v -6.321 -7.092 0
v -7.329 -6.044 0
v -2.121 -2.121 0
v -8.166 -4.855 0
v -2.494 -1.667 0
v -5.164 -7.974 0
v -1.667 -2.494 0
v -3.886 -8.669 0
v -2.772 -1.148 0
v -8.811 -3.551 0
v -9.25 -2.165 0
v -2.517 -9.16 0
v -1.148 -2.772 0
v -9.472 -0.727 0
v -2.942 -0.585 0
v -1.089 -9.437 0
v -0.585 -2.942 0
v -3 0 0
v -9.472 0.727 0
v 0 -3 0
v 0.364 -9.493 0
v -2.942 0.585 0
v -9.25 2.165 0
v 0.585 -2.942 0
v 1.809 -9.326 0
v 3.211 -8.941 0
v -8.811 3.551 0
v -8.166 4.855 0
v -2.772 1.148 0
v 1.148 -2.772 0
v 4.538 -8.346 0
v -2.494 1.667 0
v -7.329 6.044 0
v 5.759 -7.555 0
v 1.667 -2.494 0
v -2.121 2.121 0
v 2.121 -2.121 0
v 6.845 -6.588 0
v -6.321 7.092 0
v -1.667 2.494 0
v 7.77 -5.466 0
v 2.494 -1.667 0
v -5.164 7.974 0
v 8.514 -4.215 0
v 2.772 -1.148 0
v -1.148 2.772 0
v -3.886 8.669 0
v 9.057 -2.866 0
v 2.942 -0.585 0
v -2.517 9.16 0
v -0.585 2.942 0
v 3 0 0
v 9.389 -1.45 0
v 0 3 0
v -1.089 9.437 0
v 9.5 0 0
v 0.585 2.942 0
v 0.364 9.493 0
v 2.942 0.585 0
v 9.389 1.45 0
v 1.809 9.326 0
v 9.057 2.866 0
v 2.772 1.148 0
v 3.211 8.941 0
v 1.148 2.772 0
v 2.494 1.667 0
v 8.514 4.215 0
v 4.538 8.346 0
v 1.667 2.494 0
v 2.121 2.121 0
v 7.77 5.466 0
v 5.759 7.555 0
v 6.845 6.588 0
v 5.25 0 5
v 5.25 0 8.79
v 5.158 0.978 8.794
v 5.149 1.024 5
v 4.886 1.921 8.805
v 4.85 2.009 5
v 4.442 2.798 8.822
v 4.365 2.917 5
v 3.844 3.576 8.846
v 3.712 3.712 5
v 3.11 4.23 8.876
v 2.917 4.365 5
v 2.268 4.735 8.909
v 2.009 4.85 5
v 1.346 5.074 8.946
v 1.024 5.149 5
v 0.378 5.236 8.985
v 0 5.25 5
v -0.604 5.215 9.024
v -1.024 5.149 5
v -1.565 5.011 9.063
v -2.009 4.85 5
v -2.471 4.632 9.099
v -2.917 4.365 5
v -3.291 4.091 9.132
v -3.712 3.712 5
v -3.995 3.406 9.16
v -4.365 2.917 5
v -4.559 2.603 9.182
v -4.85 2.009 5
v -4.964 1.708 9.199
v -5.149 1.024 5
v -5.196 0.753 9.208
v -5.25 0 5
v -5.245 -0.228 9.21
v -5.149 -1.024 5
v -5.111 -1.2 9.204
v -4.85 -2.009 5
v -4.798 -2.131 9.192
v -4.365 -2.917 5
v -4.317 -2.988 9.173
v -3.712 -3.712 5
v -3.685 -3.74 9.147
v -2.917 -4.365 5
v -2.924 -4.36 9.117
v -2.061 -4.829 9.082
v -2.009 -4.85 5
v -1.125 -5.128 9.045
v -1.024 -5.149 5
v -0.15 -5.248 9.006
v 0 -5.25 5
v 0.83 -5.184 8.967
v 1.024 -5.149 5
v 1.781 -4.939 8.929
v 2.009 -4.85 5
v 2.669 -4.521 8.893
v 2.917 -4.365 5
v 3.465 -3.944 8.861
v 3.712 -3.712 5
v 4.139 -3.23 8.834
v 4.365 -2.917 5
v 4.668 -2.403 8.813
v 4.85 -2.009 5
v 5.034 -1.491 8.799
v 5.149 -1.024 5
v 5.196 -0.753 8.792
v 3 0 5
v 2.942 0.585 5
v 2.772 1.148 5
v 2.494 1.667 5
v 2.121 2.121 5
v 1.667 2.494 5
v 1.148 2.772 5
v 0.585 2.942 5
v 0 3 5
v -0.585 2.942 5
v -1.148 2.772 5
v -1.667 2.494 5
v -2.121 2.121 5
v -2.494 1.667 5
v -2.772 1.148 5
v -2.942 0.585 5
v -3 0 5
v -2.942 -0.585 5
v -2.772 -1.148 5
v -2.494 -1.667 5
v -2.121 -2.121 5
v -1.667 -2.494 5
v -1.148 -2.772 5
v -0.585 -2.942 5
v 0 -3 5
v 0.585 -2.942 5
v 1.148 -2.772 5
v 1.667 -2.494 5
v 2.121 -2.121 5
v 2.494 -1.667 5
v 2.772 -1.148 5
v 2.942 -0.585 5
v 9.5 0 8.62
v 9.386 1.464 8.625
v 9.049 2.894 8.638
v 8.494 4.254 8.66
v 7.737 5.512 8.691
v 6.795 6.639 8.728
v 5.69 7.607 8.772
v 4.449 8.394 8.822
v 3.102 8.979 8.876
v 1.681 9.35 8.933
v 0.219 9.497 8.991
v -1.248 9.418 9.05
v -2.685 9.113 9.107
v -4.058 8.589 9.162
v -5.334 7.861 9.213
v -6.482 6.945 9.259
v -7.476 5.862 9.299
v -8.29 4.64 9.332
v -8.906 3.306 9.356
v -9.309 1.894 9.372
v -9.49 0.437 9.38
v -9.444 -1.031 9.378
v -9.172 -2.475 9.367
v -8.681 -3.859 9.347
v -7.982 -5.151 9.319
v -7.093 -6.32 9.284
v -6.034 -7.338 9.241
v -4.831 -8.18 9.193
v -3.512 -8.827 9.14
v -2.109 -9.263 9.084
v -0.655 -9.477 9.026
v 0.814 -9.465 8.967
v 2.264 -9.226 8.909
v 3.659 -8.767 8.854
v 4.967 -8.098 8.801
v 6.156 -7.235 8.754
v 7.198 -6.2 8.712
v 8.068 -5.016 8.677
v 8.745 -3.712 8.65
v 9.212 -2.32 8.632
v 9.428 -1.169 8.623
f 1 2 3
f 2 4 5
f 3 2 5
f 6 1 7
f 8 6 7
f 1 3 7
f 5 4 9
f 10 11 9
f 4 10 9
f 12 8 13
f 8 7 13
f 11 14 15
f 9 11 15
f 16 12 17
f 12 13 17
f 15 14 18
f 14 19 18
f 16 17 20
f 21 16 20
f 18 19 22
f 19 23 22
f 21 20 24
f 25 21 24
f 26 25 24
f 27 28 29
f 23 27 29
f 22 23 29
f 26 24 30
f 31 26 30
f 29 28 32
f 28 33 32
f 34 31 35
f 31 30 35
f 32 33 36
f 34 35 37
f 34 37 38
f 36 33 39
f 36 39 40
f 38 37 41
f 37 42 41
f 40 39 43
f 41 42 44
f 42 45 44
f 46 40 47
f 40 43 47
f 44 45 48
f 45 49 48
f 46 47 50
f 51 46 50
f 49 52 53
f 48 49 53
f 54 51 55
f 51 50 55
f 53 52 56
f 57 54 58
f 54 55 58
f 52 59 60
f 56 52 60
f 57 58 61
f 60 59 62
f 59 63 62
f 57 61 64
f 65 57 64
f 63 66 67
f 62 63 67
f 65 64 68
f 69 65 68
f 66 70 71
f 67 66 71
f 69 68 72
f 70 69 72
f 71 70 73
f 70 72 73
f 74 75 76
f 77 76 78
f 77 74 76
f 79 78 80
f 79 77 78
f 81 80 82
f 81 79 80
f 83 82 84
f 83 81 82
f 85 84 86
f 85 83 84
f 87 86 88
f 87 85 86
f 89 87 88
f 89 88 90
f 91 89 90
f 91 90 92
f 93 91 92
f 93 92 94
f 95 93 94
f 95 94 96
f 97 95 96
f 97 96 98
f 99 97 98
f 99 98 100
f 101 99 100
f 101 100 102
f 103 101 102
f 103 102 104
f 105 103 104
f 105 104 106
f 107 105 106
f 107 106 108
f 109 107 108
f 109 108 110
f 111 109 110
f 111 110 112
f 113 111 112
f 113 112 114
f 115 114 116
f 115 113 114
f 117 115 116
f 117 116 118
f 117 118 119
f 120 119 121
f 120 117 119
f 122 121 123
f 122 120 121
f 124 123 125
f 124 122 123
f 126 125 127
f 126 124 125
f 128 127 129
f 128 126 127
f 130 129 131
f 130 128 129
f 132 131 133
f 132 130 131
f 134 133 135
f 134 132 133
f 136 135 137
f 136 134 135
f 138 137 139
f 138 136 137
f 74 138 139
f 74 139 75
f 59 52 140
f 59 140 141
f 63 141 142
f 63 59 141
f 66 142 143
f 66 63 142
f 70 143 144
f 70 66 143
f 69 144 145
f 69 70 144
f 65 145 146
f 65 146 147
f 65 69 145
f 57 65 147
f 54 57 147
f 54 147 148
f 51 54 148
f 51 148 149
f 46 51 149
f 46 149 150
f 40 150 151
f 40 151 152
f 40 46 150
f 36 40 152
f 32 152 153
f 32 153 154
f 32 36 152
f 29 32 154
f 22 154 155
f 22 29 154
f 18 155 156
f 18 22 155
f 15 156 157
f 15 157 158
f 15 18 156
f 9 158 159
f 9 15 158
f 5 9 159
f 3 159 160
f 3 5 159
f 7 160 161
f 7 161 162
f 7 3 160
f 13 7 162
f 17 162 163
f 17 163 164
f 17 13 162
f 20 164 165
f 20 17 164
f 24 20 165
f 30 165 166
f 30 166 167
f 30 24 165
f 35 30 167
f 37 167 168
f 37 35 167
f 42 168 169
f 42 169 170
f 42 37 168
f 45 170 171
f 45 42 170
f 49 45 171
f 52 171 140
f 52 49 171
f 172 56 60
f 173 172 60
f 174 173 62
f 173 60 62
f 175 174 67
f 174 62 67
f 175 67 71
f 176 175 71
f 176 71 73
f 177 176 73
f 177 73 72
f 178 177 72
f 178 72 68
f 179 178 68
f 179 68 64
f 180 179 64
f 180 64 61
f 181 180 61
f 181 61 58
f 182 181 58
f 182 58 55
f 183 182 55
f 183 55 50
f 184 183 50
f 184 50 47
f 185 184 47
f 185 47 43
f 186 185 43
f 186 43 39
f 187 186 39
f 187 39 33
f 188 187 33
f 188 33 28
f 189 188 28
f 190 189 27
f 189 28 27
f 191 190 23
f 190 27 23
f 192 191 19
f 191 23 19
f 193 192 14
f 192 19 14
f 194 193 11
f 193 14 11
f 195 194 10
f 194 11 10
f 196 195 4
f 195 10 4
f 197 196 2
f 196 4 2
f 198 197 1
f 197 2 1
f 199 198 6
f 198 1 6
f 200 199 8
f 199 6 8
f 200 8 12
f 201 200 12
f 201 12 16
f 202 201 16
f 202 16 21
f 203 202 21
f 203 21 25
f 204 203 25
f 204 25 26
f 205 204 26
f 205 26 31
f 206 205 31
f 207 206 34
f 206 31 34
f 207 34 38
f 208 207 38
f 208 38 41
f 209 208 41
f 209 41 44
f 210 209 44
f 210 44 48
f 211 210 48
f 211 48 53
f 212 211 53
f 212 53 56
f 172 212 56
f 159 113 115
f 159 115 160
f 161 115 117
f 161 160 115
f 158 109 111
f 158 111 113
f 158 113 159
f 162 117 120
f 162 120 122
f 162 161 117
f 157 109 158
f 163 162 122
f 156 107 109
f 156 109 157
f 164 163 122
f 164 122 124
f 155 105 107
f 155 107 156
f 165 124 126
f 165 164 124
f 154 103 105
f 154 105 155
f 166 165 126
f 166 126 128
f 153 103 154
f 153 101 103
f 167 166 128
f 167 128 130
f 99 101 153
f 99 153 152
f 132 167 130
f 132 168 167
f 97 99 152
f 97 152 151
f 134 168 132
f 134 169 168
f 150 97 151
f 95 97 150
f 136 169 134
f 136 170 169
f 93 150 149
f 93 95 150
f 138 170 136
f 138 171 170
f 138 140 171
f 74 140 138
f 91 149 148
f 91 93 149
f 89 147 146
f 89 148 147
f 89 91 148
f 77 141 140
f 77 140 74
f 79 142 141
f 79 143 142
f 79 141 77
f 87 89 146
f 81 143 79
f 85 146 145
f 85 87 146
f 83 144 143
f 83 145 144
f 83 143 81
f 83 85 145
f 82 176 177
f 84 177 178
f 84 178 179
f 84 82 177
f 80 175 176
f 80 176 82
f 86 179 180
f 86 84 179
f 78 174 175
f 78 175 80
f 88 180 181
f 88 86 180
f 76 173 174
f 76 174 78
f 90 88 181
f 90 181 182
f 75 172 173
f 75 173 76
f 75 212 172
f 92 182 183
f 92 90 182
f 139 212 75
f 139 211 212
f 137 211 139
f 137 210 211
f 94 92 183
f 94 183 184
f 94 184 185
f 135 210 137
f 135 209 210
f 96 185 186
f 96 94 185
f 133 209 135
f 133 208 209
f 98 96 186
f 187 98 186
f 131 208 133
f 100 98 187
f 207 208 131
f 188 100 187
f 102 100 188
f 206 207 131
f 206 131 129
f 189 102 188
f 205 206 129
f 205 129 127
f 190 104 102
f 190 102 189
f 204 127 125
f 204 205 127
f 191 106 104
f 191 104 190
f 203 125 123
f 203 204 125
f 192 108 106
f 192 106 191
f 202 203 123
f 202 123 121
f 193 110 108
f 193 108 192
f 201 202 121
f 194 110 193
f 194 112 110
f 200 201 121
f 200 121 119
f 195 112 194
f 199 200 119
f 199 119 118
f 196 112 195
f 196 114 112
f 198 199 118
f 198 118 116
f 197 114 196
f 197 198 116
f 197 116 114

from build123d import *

# Parameters (mm, degrees)
F0_R     = 9.5
F0_R_2   = 5.25
F1_DEPTH = 10
F2_R     = 5.25
F2_R_2   = 3
F3_DEPTH = 5
F5_DEPTH = 12.5


with BuildPart() as f1:
    # F0 (on Top) → F1 (new body)
    with BuildSketch(Plane.XY):
        Circle(F0_R)
        Circle(F0_R_2, mode=Mode.SUBTRACT)
    extrude(amount=F1_DEPTH)

    # F2 (on Top) → F3 (join)
    with BuildSketch(Plane.XY):
        Circle(F2_R)
        Circle(F2_R_2, mode=Mode.SUBTRACT)
    extrude(amount=F3_DEPTH)

    # F4 (on Front) → F5 (intersect, symmetric)
    with BuildSketch(Plane.XZ):
        Polygon((25, 8), (-25, 10), (-25, 0), (25, 0), align=None)
    extrude(amount=F5_DEPTH, both=True, mode=Mode.INTERSECT)


solid = f1.part
